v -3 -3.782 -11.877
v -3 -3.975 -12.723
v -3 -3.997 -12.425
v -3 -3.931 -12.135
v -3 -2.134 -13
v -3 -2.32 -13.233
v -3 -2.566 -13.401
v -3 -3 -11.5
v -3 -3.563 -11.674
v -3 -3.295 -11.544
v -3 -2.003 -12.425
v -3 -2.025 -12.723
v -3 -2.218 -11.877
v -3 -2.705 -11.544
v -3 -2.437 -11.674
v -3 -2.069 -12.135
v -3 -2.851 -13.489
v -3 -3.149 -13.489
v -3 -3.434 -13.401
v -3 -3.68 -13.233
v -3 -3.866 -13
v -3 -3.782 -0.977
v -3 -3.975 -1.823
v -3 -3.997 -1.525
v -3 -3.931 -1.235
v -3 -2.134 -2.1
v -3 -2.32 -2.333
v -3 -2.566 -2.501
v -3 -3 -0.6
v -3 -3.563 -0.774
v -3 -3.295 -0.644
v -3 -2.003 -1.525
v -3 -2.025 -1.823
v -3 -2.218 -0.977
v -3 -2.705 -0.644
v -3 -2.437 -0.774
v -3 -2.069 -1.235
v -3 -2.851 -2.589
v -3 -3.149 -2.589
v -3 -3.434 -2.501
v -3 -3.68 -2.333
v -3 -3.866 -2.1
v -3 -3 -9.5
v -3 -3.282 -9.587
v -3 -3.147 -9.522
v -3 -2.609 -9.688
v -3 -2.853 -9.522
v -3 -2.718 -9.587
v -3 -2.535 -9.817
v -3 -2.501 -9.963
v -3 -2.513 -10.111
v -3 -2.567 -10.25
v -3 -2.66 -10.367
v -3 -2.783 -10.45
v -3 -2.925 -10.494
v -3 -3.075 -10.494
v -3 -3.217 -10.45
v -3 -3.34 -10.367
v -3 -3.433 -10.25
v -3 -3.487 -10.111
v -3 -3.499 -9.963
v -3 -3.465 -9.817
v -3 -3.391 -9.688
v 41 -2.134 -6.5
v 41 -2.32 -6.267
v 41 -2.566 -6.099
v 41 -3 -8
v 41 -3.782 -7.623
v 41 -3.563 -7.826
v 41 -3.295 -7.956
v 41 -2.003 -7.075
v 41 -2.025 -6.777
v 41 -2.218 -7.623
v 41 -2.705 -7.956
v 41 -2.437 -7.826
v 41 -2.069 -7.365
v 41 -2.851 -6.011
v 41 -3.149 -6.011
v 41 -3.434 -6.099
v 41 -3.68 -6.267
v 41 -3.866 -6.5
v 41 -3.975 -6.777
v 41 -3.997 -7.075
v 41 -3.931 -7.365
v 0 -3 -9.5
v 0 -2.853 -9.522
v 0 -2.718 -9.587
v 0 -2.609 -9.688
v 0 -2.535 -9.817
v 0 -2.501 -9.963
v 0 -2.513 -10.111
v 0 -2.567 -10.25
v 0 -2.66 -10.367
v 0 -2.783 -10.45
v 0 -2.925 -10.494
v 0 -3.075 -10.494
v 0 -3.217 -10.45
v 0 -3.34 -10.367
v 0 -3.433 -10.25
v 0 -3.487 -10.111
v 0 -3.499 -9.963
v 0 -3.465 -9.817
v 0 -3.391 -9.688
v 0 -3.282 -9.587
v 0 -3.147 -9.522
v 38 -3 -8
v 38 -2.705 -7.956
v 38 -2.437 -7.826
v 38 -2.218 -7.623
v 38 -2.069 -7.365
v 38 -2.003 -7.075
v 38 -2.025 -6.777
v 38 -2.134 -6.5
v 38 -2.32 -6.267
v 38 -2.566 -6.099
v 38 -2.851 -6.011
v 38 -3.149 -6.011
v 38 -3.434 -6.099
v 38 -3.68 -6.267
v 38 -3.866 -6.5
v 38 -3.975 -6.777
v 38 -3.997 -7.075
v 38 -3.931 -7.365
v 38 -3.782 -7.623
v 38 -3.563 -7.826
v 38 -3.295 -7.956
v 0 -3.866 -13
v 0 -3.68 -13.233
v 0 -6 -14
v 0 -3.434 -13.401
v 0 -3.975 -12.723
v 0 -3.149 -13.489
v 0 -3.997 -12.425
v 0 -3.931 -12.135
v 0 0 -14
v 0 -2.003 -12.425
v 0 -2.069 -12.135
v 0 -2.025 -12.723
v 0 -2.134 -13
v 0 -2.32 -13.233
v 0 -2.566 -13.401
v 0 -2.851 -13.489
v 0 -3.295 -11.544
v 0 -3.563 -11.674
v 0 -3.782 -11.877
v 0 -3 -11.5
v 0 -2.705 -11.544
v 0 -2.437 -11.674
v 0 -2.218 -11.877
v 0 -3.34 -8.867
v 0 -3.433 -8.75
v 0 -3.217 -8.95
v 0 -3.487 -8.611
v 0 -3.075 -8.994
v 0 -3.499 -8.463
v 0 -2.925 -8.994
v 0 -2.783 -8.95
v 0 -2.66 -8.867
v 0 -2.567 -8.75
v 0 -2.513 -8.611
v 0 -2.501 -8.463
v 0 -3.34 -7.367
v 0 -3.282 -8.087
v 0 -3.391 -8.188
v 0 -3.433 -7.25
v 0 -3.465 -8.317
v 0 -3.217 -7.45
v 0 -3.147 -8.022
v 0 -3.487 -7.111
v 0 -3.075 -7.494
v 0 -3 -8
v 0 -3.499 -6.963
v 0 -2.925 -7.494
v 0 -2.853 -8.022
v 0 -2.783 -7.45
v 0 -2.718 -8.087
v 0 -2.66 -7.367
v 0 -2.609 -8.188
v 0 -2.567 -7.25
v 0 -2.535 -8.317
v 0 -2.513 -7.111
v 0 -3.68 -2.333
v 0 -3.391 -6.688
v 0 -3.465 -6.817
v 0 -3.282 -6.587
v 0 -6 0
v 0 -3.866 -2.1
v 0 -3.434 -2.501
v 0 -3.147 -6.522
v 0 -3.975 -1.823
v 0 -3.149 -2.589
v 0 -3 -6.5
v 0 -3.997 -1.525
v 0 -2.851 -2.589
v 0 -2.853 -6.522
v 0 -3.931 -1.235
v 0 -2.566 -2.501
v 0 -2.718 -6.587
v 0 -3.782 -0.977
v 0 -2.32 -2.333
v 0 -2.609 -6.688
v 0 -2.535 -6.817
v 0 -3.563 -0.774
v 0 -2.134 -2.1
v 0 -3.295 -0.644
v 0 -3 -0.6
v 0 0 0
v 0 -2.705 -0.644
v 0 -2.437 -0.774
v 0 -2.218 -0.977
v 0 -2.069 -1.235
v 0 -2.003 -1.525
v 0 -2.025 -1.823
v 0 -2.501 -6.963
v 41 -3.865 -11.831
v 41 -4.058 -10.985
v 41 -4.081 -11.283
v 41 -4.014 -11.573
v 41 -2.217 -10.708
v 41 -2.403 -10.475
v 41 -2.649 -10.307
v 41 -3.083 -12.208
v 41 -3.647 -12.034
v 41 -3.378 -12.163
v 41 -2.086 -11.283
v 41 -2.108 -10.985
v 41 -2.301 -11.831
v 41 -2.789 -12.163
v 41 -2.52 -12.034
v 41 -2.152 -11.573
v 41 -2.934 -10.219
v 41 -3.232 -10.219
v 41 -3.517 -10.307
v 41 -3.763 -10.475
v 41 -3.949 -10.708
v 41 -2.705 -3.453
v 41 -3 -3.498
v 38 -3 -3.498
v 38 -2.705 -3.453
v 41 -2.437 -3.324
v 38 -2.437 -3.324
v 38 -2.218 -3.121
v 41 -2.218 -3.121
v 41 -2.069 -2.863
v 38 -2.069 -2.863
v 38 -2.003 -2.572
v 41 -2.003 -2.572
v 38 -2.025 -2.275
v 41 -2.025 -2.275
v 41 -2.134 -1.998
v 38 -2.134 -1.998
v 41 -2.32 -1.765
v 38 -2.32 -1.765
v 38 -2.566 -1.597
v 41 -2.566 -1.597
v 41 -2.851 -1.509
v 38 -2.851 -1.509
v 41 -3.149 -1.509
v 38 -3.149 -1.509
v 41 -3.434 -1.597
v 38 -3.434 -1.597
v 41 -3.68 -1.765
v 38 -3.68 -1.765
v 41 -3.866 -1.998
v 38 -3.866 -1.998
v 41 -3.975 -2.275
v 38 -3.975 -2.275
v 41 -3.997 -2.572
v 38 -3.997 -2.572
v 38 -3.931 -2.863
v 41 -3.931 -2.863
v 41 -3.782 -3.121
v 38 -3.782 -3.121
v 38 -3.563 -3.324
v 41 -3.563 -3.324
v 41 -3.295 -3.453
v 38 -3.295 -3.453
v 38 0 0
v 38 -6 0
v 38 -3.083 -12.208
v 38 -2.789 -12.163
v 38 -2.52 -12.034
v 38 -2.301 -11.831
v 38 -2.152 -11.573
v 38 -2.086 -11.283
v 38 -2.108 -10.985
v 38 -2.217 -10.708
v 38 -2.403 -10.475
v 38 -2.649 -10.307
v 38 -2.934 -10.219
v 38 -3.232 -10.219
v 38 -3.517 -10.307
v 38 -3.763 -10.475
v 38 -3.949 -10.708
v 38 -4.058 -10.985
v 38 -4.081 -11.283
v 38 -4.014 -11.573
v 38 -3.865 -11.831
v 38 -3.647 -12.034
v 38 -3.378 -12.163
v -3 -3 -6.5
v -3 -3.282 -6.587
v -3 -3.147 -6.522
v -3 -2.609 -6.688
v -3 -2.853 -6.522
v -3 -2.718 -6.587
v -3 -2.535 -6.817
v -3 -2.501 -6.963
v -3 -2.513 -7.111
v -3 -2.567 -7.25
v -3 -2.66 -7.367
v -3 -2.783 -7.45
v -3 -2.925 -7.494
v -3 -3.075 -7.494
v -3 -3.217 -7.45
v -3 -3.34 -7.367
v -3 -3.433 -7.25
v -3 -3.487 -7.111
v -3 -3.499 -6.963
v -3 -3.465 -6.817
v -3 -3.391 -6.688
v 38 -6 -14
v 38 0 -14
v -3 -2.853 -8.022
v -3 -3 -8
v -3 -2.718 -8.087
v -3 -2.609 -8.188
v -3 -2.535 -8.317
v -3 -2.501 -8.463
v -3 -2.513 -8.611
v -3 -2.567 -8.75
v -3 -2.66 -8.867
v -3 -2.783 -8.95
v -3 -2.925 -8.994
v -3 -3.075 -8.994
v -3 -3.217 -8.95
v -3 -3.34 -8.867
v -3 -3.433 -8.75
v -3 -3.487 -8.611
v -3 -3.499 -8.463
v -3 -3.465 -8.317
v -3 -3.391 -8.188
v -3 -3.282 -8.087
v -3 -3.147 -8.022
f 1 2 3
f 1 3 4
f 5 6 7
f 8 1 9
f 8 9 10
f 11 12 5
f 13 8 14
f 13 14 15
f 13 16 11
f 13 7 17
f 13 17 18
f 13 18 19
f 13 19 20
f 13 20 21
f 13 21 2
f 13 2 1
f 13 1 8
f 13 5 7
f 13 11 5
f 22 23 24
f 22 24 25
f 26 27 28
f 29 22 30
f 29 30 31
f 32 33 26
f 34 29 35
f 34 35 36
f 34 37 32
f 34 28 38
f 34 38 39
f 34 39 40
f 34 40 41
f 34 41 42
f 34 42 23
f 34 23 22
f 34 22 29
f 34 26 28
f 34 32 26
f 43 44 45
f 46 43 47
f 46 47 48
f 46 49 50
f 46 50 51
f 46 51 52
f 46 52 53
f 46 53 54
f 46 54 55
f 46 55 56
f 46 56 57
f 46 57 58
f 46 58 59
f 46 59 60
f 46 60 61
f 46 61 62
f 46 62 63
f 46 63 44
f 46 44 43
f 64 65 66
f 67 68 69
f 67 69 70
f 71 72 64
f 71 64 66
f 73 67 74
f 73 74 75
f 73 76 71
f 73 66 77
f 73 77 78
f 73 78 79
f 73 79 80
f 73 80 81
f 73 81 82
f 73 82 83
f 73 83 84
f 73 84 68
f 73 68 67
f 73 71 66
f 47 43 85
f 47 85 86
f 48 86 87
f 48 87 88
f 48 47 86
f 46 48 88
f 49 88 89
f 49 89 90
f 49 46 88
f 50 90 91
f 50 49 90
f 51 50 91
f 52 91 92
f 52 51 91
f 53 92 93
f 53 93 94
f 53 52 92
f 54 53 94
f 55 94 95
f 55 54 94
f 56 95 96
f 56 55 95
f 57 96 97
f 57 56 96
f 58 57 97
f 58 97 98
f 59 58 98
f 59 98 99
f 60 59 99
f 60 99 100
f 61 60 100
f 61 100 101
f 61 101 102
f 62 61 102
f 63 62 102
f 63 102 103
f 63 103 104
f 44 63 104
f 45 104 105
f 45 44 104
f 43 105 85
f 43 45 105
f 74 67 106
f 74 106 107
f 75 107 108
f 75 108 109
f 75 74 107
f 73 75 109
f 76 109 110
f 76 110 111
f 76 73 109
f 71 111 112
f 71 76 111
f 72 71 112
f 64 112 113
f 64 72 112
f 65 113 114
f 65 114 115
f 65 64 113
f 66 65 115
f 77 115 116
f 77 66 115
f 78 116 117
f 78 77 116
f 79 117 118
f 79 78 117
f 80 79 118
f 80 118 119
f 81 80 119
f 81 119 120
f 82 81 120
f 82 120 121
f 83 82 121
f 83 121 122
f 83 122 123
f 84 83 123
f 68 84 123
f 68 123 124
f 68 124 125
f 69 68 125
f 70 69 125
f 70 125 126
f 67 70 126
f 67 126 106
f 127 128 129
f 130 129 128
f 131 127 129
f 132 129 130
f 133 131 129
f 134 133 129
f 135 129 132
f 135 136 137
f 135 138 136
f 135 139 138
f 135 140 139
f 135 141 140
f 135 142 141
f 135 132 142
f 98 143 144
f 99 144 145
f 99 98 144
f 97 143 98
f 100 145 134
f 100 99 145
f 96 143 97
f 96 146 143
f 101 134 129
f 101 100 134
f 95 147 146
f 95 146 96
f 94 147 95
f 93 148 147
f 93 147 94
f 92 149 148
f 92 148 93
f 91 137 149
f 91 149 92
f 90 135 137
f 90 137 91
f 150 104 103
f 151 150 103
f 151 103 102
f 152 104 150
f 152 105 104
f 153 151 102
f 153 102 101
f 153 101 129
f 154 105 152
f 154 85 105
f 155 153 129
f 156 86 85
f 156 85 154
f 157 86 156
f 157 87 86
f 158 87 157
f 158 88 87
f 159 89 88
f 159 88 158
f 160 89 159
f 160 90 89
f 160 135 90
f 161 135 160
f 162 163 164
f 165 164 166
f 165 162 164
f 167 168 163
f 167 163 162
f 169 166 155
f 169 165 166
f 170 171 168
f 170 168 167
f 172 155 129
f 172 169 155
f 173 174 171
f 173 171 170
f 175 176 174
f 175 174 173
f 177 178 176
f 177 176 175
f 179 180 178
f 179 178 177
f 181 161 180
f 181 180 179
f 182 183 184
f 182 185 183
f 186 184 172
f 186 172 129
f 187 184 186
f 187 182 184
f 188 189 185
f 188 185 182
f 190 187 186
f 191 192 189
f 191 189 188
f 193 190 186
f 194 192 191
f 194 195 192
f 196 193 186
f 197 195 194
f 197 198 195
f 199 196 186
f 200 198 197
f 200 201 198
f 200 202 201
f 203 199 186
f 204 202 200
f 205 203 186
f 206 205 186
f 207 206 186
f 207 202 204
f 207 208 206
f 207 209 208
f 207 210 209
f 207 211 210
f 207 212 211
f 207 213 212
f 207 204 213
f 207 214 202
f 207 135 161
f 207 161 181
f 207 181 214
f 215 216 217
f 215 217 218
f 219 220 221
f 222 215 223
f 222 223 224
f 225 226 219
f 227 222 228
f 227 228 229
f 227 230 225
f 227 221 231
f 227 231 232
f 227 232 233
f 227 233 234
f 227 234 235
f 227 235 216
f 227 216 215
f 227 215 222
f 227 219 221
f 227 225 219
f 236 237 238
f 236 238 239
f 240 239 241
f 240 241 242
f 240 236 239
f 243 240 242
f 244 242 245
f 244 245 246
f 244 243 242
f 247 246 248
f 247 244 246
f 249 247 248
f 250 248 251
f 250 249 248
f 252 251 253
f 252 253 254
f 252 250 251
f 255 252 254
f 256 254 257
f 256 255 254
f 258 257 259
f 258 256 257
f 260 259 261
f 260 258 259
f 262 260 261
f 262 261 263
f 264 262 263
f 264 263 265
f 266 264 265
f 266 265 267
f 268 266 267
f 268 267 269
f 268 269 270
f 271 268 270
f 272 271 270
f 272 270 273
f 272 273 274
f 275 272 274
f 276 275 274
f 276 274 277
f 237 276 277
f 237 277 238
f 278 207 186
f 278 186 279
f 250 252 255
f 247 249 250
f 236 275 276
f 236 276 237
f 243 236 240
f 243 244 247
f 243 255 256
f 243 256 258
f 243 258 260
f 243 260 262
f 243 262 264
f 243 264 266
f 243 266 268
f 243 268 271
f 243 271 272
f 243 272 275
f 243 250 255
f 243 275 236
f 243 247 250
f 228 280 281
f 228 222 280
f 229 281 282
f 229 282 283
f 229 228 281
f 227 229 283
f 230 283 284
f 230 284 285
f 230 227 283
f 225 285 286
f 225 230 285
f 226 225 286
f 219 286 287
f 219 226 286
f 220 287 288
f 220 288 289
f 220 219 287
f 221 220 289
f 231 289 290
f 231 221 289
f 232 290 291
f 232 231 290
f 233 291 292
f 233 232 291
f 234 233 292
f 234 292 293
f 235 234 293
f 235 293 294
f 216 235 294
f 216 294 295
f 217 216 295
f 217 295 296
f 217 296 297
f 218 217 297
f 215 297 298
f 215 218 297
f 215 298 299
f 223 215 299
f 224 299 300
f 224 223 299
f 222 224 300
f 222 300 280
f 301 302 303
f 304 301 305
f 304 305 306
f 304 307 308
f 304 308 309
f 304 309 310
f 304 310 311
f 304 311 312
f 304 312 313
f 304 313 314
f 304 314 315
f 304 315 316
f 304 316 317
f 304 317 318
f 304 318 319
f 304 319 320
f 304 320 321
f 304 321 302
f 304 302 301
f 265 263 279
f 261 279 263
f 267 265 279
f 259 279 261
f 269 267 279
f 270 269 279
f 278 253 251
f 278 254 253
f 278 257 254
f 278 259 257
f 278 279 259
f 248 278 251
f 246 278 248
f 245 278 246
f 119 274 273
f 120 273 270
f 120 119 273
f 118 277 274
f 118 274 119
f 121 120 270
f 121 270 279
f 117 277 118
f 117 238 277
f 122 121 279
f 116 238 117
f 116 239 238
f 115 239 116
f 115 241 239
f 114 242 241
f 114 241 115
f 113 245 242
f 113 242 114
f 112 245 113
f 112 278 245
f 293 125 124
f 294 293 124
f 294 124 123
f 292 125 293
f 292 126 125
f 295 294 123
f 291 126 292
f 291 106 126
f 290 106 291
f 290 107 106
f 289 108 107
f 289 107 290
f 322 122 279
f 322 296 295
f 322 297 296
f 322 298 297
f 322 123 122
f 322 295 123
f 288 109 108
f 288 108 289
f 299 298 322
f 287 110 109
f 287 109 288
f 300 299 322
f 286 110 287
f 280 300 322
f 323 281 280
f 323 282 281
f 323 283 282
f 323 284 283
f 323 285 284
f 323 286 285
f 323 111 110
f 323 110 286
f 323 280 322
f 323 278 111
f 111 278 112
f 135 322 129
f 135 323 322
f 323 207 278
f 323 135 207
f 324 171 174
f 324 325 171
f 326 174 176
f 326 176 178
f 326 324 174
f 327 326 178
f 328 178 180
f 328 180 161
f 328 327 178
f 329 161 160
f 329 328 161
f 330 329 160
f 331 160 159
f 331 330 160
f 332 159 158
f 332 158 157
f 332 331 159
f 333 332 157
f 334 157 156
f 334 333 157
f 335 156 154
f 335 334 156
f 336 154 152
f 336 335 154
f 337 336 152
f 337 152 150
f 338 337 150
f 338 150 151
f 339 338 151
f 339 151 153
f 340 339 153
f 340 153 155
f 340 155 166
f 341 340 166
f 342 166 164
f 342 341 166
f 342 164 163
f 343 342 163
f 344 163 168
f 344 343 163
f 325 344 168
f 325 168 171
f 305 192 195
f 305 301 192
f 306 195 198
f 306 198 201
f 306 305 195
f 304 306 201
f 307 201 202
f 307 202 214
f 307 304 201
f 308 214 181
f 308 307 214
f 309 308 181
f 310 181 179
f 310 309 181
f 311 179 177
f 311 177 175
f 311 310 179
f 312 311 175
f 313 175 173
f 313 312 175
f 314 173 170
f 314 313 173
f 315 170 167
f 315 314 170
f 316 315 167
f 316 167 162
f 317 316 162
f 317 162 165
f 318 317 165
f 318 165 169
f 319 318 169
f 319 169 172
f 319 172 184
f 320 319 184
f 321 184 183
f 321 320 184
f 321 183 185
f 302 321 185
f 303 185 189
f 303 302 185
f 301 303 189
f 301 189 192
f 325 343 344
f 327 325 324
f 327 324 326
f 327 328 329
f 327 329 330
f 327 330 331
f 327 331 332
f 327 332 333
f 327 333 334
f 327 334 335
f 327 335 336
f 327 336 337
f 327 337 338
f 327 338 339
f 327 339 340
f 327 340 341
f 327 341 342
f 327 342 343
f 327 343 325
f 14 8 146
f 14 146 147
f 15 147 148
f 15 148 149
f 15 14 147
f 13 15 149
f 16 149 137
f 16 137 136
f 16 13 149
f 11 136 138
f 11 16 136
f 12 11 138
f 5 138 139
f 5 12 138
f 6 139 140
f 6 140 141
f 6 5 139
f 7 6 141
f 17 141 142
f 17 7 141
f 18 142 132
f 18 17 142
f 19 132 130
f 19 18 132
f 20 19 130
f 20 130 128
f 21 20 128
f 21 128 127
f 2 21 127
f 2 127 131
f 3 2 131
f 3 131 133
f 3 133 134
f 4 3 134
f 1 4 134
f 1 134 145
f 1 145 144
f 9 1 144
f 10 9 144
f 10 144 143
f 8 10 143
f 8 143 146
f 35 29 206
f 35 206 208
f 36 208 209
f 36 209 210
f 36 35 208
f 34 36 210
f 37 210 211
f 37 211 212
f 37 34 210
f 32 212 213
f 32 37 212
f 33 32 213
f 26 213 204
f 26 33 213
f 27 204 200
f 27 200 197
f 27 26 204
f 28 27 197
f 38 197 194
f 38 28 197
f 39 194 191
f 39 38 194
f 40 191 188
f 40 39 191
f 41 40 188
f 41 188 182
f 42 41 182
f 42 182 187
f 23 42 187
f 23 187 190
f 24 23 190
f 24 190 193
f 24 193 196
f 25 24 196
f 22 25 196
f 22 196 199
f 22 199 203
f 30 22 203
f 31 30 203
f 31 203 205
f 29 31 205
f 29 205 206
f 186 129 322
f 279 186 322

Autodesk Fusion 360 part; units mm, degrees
sketch "Sketch1" plane through (0, 0, 0) normal (0, 1, 0) x (1, 0, 0)
  line L0 (0, 0) -> (38, 0)
  line L1 (38, 0) -> (38, 14)
  line L2 (38, 14) -> (0, 14)
  line L3 (0, 14) -> (0, 0)
  line L4 (3.9603, 3.1256) -> (35.9564, 3.1256) construction
  line L5 (35.9564, 3.1256) -> (35.9564, 11.1256) construction
  line L6 (35.9564, 11.1256) -> (3.9603, 11.1256) construction
  line L7 (3.9603, 11.1256) -> (3.9603, 3.1256) construction
  dimension "d1" = 14
  dimension "d2" = 38
extrude "Extrude1" add sketch "Sketch1" against normal blind 6
cylinder "CylinderPrimitive1" add diameter 2 height 3 placed x (0, 0, -1) y (0, 1, 0) z (1, 0, 0) at (38, -3, -2.4977)
sketch "Sketch3" plane through (38, 0, 0) normal (1, 0, 0) x (0, 0, -1)
  circle A0 centre (2.4977, -3) radius 1
  line L0 (14, 0) -> (0, 0)
  line L1 (0, 0) -> (0, -6)
  line L2 (0, -6) -> (14, -6)
  line L3 (14, -6) -> (14, 0)
cylinder "CylinderPrimitive2" add diameter 2 height 3 placed x (0, 0, -1) y (0, 1, 0) z (1, 0, 0) at (38, -3, -7)
cylinder "CylinderPrimitive3" add diameter 2 height 3 placed x (0, 0, -1) y (0, 1, 0) z (1, 0, 0) at (38, -3.0833, -11.2079)
sketch "Sketch5" plane through (0, 0, 0) normal (-1, 0, 0) x (0, 0, 1)
  line L0 (0, 0) -> (-14, 0)
  line L1 (-14, 0) -> (-14, -6)
  line L2 (-14, -6) -> (0, -6)
  line L3 (0, -6) -> (0, 0)
cylinder "CylinderPrimitive4" add diameter 2 height 3 placed x (0, 0, 1) y (0, 1, 0) z (-1, 0, 0) at (0, -3, -12.5)
cylinder "CylinderPrimitive5" add diameter 2 height 3 placed x (0, 0, 1) y (0, 1, 0) z (-1, 0, 0) at (0, -3, -1.6)
cylinder "CylinderPrimitive6" add diameter 1 height 3 placed x (0, 0, 1) y (0, 1, 0) z (-1, 0, 0) at (0, -3, -10)
cylinder "CylinderPrimitive7" add diameter 1 height 3 placed x (0, 0, 1) y (0, 1, 0) z (-1, 0, 0) at (0, -3, -8.5)
cylinder "CylinderPrimitive8" add diameter 1 height 3 placed x (0, 0, 1) y (0, 1, 0) z (-1, 0, 0) at (0, -3, -7)
